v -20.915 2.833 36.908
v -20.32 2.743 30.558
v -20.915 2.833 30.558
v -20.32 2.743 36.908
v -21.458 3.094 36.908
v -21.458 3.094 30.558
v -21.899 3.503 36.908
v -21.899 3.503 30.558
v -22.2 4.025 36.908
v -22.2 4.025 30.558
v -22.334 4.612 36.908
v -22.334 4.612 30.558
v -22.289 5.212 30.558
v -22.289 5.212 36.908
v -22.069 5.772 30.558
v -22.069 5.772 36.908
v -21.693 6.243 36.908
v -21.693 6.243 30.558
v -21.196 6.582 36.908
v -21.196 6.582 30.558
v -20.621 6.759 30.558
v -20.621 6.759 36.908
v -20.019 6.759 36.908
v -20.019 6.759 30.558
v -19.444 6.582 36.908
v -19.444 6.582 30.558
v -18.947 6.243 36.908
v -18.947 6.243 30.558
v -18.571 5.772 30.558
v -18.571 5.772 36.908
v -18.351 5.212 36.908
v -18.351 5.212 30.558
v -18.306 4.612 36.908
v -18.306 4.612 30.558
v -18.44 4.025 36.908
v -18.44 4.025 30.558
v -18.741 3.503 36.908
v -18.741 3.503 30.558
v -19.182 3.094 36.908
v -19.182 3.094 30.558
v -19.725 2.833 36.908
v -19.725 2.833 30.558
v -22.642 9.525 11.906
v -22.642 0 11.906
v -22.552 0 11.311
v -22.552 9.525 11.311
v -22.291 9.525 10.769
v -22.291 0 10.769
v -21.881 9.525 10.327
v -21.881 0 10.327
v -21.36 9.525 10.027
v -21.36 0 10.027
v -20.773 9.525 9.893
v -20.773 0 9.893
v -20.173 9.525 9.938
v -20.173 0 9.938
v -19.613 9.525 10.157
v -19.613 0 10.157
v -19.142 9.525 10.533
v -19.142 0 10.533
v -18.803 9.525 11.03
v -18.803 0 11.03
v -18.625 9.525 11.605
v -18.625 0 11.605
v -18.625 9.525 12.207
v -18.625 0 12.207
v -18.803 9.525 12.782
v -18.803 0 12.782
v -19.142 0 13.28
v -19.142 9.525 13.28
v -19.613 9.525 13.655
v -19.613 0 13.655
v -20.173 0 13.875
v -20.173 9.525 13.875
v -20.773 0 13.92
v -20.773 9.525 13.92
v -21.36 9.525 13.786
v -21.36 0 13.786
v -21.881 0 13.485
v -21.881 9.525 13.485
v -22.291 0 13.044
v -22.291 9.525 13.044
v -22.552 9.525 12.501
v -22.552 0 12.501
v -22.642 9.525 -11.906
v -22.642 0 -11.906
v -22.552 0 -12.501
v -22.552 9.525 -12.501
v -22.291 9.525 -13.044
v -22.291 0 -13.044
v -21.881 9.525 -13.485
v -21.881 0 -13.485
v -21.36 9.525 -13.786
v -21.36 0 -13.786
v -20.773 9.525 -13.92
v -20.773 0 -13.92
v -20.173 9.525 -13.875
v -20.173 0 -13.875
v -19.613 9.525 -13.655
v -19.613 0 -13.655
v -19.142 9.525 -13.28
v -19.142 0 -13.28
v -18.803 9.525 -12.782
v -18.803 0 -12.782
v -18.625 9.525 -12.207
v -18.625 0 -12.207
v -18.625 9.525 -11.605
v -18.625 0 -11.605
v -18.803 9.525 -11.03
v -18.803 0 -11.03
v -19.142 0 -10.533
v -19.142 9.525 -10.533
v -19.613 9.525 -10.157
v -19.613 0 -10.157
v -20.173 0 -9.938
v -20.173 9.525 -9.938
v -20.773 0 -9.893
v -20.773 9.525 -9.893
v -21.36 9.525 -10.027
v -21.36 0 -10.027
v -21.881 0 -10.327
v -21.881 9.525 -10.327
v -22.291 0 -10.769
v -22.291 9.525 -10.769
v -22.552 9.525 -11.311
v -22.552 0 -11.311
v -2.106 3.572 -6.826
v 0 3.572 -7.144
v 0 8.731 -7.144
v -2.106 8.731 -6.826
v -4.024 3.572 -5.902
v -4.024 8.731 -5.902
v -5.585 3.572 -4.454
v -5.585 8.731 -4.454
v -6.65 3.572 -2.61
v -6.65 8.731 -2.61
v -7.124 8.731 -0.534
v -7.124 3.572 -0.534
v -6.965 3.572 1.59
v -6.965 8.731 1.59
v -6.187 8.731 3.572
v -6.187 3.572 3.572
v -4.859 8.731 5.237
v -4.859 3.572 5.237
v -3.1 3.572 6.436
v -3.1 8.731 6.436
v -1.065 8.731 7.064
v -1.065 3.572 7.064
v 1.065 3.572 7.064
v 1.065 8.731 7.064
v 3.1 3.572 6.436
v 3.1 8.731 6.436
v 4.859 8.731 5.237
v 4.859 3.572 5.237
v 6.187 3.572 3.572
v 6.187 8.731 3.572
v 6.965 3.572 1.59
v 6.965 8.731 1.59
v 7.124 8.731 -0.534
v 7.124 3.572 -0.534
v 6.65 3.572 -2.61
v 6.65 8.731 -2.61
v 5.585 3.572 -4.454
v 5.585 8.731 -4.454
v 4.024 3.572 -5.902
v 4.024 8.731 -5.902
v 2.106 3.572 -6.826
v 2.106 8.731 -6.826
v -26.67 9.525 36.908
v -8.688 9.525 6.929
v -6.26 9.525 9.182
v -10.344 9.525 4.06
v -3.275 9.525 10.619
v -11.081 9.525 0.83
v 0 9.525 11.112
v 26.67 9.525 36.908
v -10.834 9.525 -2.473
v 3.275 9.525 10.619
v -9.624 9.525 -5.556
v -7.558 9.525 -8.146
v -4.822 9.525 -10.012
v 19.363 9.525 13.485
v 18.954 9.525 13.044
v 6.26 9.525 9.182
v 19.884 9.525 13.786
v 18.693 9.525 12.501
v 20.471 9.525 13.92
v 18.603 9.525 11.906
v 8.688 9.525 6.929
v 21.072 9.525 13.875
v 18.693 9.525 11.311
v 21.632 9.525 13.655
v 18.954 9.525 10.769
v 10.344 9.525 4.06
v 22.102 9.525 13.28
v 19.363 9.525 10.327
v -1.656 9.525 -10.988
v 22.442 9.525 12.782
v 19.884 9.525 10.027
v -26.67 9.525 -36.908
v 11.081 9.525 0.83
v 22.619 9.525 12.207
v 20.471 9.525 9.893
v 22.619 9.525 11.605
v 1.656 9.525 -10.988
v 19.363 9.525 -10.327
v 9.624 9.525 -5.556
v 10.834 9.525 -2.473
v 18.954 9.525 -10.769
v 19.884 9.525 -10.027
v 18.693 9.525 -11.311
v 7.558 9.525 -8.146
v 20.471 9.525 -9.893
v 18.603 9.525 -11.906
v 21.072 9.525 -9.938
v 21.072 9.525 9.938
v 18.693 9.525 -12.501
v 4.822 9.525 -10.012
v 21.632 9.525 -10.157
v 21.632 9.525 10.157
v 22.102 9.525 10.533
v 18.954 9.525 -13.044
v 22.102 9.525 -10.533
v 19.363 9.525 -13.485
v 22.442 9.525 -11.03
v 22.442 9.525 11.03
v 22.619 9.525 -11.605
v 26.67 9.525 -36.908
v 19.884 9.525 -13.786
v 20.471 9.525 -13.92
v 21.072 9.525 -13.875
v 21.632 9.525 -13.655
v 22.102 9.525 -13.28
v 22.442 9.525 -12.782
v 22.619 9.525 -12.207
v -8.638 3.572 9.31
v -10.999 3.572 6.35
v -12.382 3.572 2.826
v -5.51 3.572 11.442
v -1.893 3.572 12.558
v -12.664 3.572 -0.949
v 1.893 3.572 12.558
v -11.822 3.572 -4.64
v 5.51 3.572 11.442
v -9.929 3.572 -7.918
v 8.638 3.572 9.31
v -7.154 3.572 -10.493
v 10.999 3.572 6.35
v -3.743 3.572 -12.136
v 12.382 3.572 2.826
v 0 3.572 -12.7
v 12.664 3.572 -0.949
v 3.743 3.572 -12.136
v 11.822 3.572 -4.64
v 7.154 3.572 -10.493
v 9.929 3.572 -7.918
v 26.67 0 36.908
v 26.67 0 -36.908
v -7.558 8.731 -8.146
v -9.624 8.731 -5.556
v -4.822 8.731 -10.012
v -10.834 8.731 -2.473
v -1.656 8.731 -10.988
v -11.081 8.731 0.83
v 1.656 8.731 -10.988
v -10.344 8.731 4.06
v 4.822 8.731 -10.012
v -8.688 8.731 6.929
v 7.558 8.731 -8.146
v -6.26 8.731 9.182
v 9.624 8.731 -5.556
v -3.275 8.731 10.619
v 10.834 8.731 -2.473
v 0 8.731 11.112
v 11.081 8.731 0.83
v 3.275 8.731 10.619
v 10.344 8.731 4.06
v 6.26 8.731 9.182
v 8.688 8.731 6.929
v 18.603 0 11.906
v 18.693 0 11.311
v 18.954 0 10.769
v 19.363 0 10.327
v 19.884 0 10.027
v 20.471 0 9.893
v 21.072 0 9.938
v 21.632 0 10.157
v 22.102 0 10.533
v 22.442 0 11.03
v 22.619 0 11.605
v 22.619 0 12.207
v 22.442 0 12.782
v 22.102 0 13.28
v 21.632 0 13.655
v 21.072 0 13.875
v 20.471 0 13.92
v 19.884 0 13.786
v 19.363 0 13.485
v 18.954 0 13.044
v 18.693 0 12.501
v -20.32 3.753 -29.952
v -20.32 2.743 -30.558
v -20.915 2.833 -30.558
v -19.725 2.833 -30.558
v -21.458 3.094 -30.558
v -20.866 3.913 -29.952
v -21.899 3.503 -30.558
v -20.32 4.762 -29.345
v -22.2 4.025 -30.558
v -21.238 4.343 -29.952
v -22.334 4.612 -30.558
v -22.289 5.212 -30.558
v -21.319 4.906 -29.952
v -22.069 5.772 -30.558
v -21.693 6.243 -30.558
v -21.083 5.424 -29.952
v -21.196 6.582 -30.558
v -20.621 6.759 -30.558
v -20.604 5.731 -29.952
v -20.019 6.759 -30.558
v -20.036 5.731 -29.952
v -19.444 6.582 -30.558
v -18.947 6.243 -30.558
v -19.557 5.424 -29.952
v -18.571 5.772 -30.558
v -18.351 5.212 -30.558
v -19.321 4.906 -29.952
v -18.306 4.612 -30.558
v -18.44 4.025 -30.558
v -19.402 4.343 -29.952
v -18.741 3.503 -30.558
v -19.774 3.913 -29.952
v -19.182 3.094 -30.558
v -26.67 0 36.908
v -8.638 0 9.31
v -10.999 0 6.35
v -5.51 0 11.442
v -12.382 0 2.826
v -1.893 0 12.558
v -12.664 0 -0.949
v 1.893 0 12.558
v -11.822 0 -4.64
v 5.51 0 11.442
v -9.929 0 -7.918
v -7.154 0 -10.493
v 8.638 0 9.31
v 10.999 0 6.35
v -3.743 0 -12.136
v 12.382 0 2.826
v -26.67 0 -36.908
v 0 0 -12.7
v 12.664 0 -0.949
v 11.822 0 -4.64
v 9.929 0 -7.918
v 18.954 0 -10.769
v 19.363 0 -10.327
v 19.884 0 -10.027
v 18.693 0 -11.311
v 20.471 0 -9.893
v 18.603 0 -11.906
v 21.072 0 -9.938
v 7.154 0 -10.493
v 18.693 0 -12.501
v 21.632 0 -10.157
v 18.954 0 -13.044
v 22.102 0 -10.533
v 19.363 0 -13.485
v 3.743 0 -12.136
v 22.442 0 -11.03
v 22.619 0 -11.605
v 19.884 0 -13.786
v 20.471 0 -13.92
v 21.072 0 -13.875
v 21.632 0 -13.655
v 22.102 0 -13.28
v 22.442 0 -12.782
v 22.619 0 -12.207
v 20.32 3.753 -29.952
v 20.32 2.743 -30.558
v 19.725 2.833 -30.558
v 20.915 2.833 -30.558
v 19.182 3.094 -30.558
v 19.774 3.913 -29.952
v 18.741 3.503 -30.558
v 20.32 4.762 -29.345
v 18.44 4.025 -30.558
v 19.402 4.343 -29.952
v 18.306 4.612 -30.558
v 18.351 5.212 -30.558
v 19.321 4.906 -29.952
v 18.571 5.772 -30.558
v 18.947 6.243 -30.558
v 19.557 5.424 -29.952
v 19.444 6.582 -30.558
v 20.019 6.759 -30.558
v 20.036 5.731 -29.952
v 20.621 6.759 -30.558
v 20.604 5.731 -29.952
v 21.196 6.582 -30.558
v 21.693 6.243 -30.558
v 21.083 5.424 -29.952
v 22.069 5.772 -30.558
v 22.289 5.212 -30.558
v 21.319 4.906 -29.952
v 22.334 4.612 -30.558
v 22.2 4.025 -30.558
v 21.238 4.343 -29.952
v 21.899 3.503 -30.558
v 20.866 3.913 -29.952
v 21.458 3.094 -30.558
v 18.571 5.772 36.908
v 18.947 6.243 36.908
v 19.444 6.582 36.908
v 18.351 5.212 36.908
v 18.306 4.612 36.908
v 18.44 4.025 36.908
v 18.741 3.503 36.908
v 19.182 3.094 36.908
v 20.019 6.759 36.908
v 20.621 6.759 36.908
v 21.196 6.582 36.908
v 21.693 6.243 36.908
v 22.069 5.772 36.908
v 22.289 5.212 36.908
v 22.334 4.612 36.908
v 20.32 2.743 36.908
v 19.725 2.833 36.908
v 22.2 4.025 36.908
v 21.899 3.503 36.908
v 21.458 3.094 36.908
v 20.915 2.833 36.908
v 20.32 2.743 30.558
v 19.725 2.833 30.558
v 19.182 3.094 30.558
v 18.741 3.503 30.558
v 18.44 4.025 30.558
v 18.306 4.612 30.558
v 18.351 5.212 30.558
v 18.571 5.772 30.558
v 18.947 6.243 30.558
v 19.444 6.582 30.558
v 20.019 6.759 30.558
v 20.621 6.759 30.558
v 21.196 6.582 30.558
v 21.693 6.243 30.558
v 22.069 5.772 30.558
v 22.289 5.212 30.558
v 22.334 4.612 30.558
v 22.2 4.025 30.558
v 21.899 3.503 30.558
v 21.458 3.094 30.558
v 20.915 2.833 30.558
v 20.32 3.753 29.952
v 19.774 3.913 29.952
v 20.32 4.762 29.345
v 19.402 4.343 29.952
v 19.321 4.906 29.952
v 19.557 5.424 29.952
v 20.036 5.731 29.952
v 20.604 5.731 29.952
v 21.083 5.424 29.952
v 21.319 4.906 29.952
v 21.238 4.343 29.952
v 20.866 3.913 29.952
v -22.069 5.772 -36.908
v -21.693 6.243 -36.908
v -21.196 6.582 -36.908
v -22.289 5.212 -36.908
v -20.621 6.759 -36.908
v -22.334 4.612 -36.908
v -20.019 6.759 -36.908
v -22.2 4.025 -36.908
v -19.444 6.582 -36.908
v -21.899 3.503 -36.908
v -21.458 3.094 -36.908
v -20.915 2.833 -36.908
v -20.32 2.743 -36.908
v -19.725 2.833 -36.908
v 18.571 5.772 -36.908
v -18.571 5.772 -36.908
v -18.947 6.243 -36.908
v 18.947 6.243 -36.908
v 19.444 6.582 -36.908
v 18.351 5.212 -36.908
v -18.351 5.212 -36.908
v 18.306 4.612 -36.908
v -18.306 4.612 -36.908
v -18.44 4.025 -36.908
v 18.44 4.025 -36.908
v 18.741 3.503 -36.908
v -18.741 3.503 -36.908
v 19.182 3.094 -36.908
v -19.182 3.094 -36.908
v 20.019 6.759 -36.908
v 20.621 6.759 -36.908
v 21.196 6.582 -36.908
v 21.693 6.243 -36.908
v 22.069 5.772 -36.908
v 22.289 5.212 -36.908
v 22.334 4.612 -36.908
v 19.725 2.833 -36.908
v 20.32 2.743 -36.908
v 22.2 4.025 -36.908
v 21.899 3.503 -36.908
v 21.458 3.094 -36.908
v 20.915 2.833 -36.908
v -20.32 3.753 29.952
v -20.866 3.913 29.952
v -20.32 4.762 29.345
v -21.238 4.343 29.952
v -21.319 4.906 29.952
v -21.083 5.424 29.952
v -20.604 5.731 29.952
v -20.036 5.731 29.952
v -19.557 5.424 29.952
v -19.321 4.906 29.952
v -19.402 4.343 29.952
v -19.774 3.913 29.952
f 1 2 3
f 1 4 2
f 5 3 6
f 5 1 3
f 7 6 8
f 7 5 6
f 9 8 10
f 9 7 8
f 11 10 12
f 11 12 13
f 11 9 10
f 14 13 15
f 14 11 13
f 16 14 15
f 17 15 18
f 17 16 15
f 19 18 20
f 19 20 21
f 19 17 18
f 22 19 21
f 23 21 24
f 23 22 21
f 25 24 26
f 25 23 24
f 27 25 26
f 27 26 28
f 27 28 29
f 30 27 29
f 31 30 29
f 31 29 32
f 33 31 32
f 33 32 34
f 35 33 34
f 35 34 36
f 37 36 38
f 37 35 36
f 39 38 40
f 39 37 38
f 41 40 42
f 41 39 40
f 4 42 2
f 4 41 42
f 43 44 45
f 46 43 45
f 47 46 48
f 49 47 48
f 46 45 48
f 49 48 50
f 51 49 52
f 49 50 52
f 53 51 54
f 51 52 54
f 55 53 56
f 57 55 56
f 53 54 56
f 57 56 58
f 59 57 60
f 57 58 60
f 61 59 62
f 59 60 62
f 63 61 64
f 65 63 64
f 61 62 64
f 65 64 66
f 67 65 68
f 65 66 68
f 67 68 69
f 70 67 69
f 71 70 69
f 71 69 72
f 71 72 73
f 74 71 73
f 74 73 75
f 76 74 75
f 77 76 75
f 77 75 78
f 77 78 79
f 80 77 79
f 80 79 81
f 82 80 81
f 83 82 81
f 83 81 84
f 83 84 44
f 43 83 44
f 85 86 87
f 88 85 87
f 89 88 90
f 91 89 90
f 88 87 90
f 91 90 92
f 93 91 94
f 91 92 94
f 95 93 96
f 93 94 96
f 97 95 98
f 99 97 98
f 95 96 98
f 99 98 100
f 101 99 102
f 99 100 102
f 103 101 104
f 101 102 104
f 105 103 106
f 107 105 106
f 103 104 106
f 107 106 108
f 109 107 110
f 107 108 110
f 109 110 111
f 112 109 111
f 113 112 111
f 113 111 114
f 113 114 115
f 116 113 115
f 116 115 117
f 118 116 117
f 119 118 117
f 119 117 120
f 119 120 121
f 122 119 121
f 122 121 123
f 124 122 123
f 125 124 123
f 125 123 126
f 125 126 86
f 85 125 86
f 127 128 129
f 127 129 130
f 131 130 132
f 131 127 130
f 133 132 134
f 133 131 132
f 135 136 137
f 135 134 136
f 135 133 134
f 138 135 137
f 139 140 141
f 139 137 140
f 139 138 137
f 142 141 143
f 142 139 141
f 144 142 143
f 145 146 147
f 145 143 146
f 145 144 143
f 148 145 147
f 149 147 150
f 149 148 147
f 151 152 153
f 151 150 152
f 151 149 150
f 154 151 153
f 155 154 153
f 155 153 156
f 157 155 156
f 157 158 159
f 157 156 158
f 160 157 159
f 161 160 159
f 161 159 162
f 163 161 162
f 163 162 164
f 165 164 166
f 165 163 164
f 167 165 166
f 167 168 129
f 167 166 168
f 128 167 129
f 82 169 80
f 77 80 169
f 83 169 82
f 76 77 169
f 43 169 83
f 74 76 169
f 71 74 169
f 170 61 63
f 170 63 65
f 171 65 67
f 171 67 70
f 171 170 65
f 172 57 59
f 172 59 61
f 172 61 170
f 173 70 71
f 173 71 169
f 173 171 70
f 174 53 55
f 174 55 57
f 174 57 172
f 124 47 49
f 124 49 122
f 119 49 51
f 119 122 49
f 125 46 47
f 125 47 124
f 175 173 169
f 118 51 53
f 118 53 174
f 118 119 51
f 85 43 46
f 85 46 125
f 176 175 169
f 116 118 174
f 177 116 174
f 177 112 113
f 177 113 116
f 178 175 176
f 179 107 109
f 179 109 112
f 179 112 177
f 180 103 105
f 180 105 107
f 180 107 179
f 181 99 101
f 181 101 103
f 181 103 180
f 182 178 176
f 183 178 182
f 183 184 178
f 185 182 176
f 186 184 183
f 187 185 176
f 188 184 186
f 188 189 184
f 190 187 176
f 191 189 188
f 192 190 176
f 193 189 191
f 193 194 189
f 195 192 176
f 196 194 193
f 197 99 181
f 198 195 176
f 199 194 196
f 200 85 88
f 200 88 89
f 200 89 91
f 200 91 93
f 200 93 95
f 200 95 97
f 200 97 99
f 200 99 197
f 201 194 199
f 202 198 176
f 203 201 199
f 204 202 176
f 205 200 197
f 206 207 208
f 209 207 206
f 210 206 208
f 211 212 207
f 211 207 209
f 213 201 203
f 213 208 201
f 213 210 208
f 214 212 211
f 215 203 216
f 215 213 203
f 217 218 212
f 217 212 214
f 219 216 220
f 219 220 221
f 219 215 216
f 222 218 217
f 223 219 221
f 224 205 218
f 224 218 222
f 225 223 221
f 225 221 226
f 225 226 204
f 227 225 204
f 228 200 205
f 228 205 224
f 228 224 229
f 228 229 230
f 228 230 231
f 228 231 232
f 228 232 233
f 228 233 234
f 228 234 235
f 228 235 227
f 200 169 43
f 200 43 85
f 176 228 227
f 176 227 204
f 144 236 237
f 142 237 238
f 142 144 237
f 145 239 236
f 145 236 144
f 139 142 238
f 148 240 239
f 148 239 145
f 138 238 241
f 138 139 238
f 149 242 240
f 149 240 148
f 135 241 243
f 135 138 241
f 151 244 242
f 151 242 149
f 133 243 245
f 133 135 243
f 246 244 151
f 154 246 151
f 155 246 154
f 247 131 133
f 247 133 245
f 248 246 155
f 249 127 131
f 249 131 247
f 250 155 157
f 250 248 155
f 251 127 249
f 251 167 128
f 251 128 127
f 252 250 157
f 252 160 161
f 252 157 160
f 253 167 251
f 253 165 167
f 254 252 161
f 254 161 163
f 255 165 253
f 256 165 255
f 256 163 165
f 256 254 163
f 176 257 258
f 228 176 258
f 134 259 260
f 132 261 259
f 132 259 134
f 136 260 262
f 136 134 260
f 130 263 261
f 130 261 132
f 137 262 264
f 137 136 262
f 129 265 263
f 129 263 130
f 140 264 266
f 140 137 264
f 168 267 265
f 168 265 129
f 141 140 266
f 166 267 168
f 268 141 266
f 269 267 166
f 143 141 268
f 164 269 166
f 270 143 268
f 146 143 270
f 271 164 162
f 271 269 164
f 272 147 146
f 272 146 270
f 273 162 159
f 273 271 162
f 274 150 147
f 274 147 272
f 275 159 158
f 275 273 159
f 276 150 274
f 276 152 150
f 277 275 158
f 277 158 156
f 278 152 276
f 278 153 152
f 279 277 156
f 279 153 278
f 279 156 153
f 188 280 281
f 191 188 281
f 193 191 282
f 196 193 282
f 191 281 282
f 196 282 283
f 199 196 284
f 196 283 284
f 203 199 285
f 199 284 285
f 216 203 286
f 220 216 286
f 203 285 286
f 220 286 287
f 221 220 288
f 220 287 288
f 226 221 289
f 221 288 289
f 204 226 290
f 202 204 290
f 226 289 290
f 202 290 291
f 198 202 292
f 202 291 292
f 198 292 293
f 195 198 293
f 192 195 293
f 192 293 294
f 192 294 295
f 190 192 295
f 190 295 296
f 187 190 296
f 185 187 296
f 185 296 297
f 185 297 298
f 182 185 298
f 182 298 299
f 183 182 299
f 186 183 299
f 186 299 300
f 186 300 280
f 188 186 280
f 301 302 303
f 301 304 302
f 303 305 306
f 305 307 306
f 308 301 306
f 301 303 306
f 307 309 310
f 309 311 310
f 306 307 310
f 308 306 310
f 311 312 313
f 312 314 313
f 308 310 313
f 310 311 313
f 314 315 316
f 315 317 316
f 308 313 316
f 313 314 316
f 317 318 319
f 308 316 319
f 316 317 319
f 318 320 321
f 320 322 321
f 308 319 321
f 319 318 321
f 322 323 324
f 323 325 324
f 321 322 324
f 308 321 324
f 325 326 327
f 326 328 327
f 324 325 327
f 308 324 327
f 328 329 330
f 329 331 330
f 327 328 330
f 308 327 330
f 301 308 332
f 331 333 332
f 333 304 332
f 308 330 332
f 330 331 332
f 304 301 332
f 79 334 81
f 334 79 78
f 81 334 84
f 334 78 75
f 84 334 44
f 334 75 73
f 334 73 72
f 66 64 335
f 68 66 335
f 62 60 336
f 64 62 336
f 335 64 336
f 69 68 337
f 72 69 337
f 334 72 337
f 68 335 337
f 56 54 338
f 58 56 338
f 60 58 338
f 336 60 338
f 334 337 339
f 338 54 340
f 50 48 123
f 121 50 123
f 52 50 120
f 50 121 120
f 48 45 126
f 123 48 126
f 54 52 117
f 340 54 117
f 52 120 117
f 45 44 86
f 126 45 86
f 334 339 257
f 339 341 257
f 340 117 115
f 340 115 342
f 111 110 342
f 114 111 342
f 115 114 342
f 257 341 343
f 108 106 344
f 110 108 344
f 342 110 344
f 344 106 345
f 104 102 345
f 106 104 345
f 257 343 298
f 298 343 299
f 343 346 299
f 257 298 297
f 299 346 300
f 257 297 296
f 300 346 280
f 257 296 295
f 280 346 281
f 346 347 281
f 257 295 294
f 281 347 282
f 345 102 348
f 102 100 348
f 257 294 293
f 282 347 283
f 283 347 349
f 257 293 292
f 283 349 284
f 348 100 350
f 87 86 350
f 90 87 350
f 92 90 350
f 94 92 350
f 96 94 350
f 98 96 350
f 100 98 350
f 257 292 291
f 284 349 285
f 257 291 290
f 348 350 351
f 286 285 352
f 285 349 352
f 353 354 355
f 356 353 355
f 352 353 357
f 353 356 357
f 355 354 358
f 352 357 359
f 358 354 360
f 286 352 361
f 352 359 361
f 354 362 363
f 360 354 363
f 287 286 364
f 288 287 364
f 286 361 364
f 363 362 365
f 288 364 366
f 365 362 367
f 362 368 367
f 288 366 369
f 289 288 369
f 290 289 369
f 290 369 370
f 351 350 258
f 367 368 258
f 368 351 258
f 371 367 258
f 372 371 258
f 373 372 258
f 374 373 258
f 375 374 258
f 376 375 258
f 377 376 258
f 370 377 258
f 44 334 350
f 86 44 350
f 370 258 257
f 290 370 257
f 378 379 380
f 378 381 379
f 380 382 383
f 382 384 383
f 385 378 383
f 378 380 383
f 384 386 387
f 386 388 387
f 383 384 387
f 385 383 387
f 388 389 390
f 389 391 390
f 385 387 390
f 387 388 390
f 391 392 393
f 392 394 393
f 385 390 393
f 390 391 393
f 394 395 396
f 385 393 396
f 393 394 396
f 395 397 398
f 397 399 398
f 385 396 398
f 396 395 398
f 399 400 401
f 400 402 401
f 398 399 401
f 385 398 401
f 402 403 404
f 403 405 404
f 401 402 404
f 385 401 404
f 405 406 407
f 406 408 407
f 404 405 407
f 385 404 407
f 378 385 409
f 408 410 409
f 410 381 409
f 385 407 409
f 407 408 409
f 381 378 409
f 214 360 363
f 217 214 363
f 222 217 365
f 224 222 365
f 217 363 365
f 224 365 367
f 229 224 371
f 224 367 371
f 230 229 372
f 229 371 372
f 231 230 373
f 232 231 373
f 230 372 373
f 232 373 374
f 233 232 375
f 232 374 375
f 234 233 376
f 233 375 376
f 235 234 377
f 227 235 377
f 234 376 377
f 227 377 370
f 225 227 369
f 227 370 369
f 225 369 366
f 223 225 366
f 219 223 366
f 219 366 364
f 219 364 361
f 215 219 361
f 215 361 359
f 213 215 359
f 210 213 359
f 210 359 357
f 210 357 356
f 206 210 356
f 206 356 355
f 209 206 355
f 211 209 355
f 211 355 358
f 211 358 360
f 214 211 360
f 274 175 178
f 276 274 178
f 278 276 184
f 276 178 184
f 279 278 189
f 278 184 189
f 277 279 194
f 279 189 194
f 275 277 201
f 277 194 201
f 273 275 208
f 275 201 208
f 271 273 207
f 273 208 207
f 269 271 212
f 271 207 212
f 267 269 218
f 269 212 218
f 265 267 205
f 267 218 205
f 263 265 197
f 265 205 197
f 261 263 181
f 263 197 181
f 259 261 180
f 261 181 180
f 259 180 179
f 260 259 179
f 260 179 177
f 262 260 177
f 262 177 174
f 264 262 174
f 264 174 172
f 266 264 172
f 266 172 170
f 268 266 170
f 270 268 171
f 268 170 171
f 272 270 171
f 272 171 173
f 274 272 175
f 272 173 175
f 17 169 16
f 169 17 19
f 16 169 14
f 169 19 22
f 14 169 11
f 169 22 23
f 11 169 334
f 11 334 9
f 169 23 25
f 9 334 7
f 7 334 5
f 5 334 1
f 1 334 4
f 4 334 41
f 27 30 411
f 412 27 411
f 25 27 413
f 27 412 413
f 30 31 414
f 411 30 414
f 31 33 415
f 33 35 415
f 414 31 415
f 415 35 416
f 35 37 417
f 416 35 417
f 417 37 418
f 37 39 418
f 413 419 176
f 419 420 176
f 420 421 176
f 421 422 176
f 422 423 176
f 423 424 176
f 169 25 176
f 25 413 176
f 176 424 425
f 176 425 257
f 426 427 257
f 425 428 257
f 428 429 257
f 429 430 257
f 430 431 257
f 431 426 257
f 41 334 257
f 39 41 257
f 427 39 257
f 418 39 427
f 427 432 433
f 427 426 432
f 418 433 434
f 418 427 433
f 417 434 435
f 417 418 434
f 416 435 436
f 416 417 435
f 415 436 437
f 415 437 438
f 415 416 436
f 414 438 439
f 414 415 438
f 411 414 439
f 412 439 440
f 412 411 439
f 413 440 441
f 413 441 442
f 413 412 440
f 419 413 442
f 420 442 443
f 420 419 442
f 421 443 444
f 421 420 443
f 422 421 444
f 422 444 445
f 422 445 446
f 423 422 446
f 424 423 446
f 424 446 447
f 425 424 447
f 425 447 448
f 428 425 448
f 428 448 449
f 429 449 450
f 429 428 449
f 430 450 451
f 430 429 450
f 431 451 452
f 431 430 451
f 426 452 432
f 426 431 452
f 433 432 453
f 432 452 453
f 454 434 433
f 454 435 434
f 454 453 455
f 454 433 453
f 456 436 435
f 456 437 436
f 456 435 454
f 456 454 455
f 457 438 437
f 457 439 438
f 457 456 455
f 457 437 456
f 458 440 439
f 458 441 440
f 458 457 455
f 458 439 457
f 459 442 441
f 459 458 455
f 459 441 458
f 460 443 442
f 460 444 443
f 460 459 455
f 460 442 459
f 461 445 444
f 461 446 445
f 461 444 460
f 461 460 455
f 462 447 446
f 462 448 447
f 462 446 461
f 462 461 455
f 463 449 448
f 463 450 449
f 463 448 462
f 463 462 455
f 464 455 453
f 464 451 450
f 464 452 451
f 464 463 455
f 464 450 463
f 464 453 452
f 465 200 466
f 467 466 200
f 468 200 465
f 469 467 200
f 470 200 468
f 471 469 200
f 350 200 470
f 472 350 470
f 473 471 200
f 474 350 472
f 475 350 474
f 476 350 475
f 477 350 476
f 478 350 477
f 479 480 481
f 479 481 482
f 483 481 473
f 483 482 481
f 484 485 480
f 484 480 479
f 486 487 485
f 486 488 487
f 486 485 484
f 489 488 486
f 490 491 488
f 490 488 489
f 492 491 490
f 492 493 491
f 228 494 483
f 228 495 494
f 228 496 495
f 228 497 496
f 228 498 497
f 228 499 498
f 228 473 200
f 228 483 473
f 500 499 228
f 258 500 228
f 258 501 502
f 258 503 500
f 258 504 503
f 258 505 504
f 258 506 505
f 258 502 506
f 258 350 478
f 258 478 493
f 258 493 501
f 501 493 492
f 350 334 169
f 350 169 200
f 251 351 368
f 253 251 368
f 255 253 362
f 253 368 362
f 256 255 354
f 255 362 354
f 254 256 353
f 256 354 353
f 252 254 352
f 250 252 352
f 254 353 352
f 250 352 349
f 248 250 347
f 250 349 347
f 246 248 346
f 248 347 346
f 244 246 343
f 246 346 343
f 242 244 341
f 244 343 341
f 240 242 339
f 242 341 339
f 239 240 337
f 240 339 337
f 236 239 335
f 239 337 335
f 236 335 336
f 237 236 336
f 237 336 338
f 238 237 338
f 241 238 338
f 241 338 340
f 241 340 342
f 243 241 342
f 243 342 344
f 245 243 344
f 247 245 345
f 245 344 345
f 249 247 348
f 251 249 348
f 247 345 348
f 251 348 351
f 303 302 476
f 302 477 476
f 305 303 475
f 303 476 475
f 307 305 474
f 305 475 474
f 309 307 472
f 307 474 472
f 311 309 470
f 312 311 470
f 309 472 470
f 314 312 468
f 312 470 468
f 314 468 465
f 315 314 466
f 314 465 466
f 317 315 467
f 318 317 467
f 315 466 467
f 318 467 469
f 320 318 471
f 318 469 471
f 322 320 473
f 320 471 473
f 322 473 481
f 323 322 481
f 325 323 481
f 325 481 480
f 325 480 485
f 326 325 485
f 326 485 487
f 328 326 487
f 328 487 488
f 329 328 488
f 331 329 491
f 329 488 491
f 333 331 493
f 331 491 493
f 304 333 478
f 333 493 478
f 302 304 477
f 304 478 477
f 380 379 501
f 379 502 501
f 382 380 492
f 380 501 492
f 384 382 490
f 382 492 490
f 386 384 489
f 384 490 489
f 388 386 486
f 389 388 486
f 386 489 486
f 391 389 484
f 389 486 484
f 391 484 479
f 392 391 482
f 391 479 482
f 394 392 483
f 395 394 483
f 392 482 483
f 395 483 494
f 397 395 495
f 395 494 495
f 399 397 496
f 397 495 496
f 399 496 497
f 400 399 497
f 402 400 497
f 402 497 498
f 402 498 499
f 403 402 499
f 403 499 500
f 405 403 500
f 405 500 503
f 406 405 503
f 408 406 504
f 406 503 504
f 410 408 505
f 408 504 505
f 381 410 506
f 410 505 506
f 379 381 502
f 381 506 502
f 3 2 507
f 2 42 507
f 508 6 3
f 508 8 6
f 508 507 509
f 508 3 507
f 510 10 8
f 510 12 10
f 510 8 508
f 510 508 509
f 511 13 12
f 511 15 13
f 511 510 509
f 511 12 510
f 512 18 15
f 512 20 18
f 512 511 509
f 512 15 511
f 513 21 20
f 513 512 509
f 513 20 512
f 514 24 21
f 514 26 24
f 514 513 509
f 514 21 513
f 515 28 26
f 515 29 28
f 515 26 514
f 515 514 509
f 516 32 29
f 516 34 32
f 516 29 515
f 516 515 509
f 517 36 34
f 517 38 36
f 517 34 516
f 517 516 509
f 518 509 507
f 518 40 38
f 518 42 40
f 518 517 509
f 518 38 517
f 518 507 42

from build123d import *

# Parameters (mm, degrees)
SKETCH2_W                           = 53.34
SKETCH2_H                           = 73.816694632
SKETCH2_R                           = 7.14375
BOSS_EXTRUDE1_DEPTH                 = 9.525
SKETCH3_R                           = 11.1125
CUT_EXTRUDE1_DEPTH                  = 0.79375
SKETCH4_R                           = 12.7
CUT_EXTRUDE2_DEPTH                  = 3.571875
TAP_DRILL_FOR_10_32_TAP1_AT_2_COUNT = 2
TAP_DRILL_FOR_10_32_TAP1_AT_2_PITCH = 40.64
TAP_DRILL_FOR_10_32_TAP2_D          = 4.0386


with BuildPart() as part:
    # Sketch2 → Boss-Extrude1 (new body)
    with BuildSketch(Plane(origin=(0, 0, 0), x_dir=(1, 0, 0), z_dir=(0, 1, 0))):
        Rectangle(SKETCH2_W, SKETCH2_H)
        with Locations(Location((0, 0, 0), (0, 0, 90))):
            Circle(SKETCH2_R, mode=Mode.SUBTRACT)
    extrude(amount=BOSS_EXTRUDE1_DEPTH)

    # Sketch3 → Cut-Extrude1 (cut)
    with BuildSketch(Plane(origin=(0, 9.525, 0), x_dir=(1, 0, 0), z_dir=(0, 1, 0))):
        with Locations(Location((0, 0, 0), (0, 0, 270))):
            Circle(SKETCH3_R)
    extrude(amount=-CUT_EXTRUDE1_DEPTH, mode=Mode.SUBTRACT)

    # Sketch4 → Cut-Extrude2 (cut)
    with BuildSketch(Plane.XZ):
        with Locations(Location((0, 0, 0), (0, 0, 270))):
            Circle(SKETCH4_R)
    extrude(amount=-CUT_EXTRUDE2_DEPTH, mode=Mode.SUBTRACT)

    # Sketch6 → Tap Drill for #10-32 Tap1 (revolve, cut)
    with BuildSketch(Plane(origin=(-20.32, 4.7625, 36.908347316), x_dir=(0, -1, 0), z_dir=(1, 0, 0))):
        Polygon((0, 0), (0, 7.563317848), (2.0193, 6.35), (2.0193, 0), align=None)
    tap_drill_for_10_32_tap1 = revolve(axis=Axis((-20.32, 4.7625, 43.258347316), (0, 0, -1)), mode=Mode.SUBTRACT)

    # Tap Drill for #10-32 Tap1 at 2: Tap Drill for #10-32 Tap1 ×2
    with Locations(*[(i * TAP_DRILL_FOR_10_32_TAP1_AT_2_PITCH, 0, 0) for i in range(1, TAP_DRILL_FOR_10_32_TAP1_AT_2_COUNT)]):
        add(tap_drill_for_10_32_tap1, mode=Mode.SUBTRACT)

    # Mirror1: Tap Drill for #10-32 Tap1 across plane
    add(tap_drill_for_10_32_tap1.mirror(Plane.XY), mode=Mode.SUBTRACT)

    # Mirror1 copy 1 sketch → Mirror1 copy 1 (revolve, cut)
    with BuildSketch(Plane(origin=(20.32, 4.7625, -36.908347316), x_dir=(0, -1, 0), z_dir=(1, 0, 0))):
        Polygon((0, 0), (0, -7.563317848), (2.0193, -6.35), (2.0193, 0), align=None)
    revolve(axis=Axis((20.32, 4.7625, -43.258347316), (0, 0, -1)), mode=Mode.SUBTRACT)

    # Tap Drill for #10-32 Tap2 (through all)
    with Locations(Plane(origin=(0, 9.525, 0), x_dir=(1, 0, 0), z_dir=(0, 1, 0))):
        with Locations((-20.622229928, 11.90625), (-20.622229928, -11.90625), (20.622229928, -11.90625), (20.622229928, 11.90625)):
            Hole(TAP_DRILL_FOR_10_32_TAP2_D / 2)


solid = part.part
